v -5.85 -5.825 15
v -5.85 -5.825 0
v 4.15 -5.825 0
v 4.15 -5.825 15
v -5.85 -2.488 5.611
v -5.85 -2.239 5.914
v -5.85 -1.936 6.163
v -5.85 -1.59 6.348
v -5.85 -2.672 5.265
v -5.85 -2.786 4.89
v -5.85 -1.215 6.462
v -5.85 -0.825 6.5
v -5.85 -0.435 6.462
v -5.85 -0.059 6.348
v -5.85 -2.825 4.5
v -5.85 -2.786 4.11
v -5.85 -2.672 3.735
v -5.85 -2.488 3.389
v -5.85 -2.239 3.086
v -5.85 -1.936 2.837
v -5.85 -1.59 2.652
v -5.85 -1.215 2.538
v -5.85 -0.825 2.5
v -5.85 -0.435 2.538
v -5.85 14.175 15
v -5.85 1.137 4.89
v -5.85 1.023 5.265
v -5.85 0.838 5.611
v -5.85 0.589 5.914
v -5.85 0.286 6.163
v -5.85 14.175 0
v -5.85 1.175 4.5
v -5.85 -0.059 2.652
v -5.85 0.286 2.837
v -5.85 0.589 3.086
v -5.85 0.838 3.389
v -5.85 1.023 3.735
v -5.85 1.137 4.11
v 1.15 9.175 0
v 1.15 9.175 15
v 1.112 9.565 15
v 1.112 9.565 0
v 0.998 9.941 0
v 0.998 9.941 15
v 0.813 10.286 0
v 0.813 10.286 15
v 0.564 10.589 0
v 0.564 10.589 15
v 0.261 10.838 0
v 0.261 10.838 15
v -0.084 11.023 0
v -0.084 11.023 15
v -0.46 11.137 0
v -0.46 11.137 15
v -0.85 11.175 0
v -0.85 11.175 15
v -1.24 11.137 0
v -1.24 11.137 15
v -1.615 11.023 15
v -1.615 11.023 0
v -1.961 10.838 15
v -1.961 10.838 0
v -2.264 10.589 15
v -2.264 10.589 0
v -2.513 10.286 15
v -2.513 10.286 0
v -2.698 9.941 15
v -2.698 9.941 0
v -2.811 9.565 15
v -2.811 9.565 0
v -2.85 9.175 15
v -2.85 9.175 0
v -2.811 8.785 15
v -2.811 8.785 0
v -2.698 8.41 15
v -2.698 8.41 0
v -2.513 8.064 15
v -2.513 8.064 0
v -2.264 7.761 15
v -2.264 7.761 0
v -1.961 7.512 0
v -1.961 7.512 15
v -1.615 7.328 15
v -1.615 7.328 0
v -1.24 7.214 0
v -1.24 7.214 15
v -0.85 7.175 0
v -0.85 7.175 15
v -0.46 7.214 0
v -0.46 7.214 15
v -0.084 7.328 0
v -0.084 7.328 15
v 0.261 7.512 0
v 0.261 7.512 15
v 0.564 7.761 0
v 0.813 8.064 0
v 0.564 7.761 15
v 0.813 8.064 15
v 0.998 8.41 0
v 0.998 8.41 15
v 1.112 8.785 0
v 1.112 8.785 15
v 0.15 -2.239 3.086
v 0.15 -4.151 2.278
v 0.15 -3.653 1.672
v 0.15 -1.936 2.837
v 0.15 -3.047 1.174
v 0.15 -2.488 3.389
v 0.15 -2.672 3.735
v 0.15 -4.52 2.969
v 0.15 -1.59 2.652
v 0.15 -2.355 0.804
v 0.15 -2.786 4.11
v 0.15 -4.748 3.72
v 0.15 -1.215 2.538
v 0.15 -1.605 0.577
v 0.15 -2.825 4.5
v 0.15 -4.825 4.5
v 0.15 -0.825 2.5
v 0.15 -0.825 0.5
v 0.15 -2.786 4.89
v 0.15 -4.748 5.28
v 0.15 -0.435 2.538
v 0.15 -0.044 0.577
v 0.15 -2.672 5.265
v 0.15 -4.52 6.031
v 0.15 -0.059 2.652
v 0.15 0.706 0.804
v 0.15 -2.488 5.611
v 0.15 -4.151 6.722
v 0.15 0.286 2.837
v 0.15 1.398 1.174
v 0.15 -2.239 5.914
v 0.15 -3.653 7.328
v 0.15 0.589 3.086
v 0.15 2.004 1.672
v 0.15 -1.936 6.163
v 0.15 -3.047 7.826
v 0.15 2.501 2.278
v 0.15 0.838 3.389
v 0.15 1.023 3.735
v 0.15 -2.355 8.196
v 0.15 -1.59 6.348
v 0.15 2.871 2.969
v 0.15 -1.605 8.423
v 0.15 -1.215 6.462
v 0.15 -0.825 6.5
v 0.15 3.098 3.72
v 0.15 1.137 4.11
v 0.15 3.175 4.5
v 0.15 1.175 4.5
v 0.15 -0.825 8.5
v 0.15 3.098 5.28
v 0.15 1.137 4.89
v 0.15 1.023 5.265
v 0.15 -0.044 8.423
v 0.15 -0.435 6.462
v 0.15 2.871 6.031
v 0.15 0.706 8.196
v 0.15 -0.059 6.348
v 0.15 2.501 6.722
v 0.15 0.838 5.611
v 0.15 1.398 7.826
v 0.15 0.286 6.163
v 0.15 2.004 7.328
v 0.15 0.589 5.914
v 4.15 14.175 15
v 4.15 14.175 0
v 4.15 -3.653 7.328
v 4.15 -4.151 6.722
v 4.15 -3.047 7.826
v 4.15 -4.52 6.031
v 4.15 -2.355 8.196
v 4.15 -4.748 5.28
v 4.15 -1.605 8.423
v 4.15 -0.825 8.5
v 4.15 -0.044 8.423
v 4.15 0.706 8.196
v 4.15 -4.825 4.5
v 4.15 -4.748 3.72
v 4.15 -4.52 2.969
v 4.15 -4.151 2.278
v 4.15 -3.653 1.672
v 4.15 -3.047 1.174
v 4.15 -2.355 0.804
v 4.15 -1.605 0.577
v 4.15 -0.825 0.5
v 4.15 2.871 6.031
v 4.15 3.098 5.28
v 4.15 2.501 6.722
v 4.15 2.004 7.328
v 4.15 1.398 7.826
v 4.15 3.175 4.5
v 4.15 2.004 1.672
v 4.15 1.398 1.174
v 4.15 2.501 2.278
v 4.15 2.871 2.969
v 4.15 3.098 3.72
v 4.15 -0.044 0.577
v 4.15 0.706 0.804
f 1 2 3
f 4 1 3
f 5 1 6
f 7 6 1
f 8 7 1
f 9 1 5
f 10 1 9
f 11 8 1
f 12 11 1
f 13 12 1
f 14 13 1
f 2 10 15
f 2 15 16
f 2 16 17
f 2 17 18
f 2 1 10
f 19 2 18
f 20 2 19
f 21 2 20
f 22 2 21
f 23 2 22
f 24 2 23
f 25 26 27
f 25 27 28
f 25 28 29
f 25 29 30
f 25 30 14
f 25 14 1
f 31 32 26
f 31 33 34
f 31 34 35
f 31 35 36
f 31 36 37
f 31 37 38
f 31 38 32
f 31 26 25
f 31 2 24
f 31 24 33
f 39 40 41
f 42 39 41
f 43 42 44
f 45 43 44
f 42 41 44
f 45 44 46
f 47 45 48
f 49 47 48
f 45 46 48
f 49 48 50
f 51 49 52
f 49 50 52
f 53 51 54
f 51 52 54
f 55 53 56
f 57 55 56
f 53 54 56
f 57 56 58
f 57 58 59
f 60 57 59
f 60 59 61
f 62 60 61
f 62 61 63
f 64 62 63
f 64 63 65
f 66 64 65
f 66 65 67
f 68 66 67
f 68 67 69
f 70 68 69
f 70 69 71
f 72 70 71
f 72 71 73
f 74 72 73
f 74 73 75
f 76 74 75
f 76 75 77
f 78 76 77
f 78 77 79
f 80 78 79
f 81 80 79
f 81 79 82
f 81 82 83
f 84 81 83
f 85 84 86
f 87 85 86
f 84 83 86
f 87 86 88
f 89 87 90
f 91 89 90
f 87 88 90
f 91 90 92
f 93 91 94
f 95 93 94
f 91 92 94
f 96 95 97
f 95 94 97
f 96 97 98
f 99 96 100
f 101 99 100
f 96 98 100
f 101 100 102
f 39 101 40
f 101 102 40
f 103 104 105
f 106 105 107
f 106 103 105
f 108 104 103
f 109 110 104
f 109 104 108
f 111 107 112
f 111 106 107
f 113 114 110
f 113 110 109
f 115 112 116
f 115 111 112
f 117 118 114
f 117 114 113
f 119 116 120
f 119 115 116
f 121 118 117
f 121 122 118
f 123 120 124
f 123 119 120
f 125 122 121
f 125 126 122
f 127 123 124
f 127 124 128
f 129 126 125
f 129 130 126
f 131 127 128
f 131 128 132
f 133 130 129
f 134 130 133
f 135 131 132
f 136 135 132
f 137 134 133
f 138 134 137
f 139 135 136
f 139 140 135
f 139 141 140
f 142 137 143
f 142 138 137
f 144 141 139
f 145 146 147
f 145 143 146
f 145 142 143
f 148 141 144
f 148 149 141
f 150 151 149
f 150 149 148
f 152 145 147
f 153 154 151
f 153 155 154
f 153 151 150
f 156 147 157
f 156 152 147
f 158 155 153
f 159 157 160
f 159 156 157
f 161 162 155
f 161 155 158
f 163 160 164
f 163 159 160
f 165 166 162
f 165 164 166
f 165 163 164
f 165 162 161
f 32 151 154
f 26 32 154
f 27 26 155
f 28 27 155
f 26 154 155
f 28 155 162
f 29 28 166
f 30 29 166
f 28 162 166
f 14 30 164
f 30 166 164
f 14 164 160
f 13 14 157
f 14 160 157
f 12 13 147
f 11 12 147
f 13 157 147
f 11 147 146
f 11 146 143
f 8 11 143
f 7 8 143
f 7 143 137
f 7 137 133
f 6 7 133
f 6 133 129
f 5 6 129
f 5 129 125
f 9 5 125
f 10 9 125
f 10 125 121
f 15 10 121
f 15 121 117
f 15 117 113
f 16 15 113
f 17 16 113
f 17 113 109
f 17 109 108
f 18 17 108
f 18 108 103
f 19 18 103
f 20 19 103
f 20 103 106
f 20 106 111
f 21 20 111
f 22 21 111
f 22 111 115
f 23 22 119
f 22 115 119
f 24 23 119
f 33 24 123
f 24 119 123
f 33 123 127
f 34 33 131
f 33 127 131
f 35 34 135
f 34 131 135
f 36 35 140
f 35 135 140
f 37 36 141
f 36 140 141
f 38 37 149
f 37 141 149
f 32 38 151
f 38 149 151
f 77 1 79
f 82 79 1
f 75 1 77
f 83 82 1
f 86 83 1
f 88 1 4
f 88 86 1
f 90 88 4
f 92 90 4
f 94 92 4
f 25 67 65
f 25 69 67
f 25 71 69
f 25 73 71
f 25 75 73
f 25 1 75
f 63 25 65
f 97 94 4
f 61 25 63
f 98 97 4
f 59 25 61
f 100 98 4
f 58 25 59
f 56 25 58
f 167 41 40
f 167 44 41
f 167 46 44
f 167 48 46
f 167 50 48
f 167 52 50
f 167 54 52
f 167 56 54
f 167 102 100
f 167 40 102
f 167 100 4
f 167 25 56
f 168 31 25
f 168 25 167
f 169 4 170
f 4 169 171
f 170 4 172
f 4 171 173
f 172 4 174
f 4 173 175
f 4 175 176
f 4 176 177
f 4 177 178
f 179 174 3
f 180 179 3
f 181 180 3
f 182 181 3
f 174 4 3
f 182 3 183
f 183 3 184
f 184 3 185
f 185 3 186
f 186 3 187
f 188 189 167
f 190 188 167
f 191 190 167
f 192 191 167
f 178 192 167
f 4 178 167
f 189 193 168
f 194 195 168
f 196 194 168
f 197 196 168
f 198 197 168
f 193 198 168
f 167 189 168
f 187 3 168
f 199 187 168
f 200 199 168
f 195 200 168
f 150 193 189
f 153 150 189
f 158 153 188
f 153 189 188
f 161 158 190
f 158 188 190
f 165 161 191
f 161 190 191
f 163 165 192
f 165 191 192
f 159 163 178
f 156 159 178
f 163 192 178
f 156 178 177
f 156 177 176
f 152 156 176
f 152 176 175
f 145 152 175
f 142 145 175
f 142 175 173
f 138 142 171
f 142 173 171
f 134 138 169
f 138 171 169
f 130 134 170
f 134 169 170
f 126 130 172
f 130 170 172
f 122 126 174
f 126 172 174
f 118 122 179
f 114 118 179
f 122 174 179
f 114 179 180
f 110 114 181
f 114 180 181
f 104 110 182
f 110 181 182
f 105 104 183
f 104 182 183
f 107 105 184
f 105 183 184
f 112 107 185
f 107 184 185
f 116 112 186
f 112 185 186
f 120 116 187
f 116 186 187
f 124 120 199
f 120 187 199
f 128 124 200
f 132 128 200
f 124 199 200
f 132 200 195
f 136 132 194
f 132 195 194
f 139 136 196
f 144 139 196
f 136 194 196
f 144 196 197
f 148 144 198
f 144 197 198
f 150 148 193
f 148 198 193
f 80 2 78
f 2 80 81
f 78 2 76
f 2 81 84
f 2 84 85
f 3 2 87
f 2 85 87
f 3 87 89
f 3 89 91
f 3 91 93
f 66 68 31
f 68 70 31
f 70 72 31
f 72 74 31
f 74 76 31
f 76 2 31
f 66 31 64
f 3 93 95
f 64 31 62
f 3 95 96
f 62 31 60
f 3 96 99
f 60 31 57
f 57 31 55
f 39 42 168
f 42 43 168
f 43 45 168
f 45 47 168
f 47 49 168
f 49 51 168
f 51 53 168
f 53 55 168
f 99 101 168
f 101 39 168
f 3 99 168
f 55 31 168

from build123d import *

# Parameters (mm, degrees)
F0_W     = 10
F0_H     = 20
F1_DEPTH = 15
F2_R     = 2
F3_DEPTH = 20
F2_R_2   = 4
F4_DEPTH = 4
F5_R     = 2
F6_DEPTH = 20


with BuildPart() as f1:
    # F0 (on Top) → F1 (new body)
    with BuildSketch(Plane.XY):
        with Locations((-0.84982, 4.175278)):
            Rectangle(F0_W, F0_H)
    extrude(amount=F1_DEPTH)

    # F2 (on face) → F3 (cut)
    with BuildSketch(Plane.YZ.offset(4.15018)):
        with Locations((-0.824722, 4.5)):
            Circle(F2_R)
    extrude(amount=-F3_DEPTH, mode=Mode.SUBTRACT)

    # F2 (on face) → F4 (cut)
    with BuildSketch(Plane.YZ.offset(4.15018)):
        with Locations((-0.824722, 4.5)):
            Circle(F2_R_2)
        with Locations((-0.824722, 4.5)):
            Circle(F2_R, mode=Mode.SUBTRACT)
    extrude(amount=-F4_DEPTH, mode=Mode.SUBTRACT)

    # F5 (on face) → F6 (cut)
    with BuildSketch(Plane.XY.offset(15)):
        with Locations((-0.84982, 9.175278)):
            Circle(F5_R)
    extrude(amount=-F6_DEPTH, mode=Mode.SUBTRACT)


solid = f1.part
